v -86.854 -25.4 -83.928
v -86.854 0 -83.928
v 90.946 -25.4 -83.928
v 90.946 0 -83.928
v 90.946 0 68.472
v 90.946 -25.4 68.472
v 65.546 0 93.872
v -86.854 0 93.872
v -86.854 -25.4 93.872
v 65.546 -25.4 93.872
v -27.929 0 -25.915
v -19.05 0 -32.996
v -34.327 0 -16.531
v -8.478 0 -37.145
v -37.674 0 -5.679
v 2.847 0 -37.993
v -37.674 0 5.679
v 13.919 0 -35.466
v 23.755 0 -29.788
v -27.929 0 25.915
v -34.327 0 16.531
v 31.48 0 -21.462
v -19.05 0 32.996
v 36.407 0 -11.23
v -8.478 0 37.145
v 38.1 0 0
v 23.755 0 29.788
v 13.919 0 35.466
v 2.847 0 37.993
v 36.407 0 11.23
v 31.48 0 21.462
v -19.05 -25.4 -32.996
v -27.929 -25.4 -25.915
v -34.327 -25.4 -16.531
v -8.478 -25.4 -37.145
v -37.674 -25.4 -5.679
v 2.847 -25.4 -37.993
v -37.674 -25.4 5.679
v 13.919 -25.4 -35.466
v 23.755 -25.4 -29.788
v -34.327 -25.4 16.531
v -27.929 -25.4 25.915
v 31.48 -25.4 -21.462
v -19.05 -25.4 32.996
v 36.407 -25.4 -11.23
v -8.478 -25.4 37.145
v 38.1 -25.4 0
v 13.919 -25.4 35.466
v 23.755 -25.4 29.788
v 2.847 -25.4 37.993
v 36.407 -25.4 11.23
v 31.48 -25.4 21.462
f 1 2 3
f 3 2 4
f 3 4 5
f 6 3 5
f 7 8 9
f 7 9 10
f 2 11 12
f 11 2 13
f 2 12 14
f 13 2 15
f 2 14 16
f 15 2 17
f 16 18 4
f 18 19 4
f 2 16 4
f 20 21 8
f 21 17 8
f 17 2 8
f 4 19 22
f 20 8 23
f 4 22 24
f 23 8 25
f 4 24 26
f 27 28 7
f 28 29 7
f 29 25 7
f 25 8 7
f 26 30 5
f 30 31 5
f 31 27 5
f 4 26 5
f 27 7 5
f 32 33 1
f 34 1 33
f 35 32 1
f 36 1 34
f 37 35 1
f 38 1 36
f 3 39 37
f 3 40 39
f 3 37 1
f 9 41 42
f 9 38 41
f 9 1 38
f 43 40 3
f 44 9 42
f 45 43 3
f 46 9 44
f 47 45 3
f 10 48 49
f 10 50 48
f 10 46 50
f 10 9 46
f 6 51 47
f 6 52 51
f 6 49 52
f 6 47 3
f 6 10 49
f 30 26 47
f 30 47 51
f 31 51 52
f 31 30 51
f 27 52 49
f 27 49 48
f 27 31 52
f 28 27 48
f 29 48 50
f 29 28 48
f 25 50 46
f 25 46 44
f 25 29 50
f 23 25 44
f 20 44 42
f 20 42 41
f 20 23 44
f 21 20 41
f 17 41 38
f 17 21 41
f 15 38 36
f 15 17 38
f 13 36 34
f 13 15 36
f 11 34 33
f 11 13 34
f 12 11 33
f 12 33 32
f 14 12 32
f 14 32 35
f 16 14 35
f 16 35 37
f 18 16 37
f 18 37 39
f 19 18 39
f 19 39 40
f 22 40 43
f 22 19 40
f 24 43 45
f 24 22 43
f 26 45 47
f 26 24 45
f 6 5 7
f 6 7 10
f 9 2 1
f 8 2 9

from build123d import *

# Parameters (mm, degrees)
F0_W     = 177.8
F0_H     = 177.8
F0_R     = 38.1
F1_DEPTH = 25.4
F2_SIZE  = 25.4


with BuildPart() as f1:
    # F0 (on Front) → F1 (new body)
    with BuildSketch(Plane.XZ):
        with Locations((2.04625, 4.972448)):
            Rectangle(F0_W, F0_H)
        Circle(F0_R, mode=Mode.SUBTRACT)
    extrude(amount=F1_DEPTH)

    # F2
    f2_edges = [f1.edges().sort_by_distance(p)[0] for p in [
        (90.94625, -12.7, 93.872448),
    ]]
    chamfer(f2_edges, length=F2_SIZE)


solid = f1.part
